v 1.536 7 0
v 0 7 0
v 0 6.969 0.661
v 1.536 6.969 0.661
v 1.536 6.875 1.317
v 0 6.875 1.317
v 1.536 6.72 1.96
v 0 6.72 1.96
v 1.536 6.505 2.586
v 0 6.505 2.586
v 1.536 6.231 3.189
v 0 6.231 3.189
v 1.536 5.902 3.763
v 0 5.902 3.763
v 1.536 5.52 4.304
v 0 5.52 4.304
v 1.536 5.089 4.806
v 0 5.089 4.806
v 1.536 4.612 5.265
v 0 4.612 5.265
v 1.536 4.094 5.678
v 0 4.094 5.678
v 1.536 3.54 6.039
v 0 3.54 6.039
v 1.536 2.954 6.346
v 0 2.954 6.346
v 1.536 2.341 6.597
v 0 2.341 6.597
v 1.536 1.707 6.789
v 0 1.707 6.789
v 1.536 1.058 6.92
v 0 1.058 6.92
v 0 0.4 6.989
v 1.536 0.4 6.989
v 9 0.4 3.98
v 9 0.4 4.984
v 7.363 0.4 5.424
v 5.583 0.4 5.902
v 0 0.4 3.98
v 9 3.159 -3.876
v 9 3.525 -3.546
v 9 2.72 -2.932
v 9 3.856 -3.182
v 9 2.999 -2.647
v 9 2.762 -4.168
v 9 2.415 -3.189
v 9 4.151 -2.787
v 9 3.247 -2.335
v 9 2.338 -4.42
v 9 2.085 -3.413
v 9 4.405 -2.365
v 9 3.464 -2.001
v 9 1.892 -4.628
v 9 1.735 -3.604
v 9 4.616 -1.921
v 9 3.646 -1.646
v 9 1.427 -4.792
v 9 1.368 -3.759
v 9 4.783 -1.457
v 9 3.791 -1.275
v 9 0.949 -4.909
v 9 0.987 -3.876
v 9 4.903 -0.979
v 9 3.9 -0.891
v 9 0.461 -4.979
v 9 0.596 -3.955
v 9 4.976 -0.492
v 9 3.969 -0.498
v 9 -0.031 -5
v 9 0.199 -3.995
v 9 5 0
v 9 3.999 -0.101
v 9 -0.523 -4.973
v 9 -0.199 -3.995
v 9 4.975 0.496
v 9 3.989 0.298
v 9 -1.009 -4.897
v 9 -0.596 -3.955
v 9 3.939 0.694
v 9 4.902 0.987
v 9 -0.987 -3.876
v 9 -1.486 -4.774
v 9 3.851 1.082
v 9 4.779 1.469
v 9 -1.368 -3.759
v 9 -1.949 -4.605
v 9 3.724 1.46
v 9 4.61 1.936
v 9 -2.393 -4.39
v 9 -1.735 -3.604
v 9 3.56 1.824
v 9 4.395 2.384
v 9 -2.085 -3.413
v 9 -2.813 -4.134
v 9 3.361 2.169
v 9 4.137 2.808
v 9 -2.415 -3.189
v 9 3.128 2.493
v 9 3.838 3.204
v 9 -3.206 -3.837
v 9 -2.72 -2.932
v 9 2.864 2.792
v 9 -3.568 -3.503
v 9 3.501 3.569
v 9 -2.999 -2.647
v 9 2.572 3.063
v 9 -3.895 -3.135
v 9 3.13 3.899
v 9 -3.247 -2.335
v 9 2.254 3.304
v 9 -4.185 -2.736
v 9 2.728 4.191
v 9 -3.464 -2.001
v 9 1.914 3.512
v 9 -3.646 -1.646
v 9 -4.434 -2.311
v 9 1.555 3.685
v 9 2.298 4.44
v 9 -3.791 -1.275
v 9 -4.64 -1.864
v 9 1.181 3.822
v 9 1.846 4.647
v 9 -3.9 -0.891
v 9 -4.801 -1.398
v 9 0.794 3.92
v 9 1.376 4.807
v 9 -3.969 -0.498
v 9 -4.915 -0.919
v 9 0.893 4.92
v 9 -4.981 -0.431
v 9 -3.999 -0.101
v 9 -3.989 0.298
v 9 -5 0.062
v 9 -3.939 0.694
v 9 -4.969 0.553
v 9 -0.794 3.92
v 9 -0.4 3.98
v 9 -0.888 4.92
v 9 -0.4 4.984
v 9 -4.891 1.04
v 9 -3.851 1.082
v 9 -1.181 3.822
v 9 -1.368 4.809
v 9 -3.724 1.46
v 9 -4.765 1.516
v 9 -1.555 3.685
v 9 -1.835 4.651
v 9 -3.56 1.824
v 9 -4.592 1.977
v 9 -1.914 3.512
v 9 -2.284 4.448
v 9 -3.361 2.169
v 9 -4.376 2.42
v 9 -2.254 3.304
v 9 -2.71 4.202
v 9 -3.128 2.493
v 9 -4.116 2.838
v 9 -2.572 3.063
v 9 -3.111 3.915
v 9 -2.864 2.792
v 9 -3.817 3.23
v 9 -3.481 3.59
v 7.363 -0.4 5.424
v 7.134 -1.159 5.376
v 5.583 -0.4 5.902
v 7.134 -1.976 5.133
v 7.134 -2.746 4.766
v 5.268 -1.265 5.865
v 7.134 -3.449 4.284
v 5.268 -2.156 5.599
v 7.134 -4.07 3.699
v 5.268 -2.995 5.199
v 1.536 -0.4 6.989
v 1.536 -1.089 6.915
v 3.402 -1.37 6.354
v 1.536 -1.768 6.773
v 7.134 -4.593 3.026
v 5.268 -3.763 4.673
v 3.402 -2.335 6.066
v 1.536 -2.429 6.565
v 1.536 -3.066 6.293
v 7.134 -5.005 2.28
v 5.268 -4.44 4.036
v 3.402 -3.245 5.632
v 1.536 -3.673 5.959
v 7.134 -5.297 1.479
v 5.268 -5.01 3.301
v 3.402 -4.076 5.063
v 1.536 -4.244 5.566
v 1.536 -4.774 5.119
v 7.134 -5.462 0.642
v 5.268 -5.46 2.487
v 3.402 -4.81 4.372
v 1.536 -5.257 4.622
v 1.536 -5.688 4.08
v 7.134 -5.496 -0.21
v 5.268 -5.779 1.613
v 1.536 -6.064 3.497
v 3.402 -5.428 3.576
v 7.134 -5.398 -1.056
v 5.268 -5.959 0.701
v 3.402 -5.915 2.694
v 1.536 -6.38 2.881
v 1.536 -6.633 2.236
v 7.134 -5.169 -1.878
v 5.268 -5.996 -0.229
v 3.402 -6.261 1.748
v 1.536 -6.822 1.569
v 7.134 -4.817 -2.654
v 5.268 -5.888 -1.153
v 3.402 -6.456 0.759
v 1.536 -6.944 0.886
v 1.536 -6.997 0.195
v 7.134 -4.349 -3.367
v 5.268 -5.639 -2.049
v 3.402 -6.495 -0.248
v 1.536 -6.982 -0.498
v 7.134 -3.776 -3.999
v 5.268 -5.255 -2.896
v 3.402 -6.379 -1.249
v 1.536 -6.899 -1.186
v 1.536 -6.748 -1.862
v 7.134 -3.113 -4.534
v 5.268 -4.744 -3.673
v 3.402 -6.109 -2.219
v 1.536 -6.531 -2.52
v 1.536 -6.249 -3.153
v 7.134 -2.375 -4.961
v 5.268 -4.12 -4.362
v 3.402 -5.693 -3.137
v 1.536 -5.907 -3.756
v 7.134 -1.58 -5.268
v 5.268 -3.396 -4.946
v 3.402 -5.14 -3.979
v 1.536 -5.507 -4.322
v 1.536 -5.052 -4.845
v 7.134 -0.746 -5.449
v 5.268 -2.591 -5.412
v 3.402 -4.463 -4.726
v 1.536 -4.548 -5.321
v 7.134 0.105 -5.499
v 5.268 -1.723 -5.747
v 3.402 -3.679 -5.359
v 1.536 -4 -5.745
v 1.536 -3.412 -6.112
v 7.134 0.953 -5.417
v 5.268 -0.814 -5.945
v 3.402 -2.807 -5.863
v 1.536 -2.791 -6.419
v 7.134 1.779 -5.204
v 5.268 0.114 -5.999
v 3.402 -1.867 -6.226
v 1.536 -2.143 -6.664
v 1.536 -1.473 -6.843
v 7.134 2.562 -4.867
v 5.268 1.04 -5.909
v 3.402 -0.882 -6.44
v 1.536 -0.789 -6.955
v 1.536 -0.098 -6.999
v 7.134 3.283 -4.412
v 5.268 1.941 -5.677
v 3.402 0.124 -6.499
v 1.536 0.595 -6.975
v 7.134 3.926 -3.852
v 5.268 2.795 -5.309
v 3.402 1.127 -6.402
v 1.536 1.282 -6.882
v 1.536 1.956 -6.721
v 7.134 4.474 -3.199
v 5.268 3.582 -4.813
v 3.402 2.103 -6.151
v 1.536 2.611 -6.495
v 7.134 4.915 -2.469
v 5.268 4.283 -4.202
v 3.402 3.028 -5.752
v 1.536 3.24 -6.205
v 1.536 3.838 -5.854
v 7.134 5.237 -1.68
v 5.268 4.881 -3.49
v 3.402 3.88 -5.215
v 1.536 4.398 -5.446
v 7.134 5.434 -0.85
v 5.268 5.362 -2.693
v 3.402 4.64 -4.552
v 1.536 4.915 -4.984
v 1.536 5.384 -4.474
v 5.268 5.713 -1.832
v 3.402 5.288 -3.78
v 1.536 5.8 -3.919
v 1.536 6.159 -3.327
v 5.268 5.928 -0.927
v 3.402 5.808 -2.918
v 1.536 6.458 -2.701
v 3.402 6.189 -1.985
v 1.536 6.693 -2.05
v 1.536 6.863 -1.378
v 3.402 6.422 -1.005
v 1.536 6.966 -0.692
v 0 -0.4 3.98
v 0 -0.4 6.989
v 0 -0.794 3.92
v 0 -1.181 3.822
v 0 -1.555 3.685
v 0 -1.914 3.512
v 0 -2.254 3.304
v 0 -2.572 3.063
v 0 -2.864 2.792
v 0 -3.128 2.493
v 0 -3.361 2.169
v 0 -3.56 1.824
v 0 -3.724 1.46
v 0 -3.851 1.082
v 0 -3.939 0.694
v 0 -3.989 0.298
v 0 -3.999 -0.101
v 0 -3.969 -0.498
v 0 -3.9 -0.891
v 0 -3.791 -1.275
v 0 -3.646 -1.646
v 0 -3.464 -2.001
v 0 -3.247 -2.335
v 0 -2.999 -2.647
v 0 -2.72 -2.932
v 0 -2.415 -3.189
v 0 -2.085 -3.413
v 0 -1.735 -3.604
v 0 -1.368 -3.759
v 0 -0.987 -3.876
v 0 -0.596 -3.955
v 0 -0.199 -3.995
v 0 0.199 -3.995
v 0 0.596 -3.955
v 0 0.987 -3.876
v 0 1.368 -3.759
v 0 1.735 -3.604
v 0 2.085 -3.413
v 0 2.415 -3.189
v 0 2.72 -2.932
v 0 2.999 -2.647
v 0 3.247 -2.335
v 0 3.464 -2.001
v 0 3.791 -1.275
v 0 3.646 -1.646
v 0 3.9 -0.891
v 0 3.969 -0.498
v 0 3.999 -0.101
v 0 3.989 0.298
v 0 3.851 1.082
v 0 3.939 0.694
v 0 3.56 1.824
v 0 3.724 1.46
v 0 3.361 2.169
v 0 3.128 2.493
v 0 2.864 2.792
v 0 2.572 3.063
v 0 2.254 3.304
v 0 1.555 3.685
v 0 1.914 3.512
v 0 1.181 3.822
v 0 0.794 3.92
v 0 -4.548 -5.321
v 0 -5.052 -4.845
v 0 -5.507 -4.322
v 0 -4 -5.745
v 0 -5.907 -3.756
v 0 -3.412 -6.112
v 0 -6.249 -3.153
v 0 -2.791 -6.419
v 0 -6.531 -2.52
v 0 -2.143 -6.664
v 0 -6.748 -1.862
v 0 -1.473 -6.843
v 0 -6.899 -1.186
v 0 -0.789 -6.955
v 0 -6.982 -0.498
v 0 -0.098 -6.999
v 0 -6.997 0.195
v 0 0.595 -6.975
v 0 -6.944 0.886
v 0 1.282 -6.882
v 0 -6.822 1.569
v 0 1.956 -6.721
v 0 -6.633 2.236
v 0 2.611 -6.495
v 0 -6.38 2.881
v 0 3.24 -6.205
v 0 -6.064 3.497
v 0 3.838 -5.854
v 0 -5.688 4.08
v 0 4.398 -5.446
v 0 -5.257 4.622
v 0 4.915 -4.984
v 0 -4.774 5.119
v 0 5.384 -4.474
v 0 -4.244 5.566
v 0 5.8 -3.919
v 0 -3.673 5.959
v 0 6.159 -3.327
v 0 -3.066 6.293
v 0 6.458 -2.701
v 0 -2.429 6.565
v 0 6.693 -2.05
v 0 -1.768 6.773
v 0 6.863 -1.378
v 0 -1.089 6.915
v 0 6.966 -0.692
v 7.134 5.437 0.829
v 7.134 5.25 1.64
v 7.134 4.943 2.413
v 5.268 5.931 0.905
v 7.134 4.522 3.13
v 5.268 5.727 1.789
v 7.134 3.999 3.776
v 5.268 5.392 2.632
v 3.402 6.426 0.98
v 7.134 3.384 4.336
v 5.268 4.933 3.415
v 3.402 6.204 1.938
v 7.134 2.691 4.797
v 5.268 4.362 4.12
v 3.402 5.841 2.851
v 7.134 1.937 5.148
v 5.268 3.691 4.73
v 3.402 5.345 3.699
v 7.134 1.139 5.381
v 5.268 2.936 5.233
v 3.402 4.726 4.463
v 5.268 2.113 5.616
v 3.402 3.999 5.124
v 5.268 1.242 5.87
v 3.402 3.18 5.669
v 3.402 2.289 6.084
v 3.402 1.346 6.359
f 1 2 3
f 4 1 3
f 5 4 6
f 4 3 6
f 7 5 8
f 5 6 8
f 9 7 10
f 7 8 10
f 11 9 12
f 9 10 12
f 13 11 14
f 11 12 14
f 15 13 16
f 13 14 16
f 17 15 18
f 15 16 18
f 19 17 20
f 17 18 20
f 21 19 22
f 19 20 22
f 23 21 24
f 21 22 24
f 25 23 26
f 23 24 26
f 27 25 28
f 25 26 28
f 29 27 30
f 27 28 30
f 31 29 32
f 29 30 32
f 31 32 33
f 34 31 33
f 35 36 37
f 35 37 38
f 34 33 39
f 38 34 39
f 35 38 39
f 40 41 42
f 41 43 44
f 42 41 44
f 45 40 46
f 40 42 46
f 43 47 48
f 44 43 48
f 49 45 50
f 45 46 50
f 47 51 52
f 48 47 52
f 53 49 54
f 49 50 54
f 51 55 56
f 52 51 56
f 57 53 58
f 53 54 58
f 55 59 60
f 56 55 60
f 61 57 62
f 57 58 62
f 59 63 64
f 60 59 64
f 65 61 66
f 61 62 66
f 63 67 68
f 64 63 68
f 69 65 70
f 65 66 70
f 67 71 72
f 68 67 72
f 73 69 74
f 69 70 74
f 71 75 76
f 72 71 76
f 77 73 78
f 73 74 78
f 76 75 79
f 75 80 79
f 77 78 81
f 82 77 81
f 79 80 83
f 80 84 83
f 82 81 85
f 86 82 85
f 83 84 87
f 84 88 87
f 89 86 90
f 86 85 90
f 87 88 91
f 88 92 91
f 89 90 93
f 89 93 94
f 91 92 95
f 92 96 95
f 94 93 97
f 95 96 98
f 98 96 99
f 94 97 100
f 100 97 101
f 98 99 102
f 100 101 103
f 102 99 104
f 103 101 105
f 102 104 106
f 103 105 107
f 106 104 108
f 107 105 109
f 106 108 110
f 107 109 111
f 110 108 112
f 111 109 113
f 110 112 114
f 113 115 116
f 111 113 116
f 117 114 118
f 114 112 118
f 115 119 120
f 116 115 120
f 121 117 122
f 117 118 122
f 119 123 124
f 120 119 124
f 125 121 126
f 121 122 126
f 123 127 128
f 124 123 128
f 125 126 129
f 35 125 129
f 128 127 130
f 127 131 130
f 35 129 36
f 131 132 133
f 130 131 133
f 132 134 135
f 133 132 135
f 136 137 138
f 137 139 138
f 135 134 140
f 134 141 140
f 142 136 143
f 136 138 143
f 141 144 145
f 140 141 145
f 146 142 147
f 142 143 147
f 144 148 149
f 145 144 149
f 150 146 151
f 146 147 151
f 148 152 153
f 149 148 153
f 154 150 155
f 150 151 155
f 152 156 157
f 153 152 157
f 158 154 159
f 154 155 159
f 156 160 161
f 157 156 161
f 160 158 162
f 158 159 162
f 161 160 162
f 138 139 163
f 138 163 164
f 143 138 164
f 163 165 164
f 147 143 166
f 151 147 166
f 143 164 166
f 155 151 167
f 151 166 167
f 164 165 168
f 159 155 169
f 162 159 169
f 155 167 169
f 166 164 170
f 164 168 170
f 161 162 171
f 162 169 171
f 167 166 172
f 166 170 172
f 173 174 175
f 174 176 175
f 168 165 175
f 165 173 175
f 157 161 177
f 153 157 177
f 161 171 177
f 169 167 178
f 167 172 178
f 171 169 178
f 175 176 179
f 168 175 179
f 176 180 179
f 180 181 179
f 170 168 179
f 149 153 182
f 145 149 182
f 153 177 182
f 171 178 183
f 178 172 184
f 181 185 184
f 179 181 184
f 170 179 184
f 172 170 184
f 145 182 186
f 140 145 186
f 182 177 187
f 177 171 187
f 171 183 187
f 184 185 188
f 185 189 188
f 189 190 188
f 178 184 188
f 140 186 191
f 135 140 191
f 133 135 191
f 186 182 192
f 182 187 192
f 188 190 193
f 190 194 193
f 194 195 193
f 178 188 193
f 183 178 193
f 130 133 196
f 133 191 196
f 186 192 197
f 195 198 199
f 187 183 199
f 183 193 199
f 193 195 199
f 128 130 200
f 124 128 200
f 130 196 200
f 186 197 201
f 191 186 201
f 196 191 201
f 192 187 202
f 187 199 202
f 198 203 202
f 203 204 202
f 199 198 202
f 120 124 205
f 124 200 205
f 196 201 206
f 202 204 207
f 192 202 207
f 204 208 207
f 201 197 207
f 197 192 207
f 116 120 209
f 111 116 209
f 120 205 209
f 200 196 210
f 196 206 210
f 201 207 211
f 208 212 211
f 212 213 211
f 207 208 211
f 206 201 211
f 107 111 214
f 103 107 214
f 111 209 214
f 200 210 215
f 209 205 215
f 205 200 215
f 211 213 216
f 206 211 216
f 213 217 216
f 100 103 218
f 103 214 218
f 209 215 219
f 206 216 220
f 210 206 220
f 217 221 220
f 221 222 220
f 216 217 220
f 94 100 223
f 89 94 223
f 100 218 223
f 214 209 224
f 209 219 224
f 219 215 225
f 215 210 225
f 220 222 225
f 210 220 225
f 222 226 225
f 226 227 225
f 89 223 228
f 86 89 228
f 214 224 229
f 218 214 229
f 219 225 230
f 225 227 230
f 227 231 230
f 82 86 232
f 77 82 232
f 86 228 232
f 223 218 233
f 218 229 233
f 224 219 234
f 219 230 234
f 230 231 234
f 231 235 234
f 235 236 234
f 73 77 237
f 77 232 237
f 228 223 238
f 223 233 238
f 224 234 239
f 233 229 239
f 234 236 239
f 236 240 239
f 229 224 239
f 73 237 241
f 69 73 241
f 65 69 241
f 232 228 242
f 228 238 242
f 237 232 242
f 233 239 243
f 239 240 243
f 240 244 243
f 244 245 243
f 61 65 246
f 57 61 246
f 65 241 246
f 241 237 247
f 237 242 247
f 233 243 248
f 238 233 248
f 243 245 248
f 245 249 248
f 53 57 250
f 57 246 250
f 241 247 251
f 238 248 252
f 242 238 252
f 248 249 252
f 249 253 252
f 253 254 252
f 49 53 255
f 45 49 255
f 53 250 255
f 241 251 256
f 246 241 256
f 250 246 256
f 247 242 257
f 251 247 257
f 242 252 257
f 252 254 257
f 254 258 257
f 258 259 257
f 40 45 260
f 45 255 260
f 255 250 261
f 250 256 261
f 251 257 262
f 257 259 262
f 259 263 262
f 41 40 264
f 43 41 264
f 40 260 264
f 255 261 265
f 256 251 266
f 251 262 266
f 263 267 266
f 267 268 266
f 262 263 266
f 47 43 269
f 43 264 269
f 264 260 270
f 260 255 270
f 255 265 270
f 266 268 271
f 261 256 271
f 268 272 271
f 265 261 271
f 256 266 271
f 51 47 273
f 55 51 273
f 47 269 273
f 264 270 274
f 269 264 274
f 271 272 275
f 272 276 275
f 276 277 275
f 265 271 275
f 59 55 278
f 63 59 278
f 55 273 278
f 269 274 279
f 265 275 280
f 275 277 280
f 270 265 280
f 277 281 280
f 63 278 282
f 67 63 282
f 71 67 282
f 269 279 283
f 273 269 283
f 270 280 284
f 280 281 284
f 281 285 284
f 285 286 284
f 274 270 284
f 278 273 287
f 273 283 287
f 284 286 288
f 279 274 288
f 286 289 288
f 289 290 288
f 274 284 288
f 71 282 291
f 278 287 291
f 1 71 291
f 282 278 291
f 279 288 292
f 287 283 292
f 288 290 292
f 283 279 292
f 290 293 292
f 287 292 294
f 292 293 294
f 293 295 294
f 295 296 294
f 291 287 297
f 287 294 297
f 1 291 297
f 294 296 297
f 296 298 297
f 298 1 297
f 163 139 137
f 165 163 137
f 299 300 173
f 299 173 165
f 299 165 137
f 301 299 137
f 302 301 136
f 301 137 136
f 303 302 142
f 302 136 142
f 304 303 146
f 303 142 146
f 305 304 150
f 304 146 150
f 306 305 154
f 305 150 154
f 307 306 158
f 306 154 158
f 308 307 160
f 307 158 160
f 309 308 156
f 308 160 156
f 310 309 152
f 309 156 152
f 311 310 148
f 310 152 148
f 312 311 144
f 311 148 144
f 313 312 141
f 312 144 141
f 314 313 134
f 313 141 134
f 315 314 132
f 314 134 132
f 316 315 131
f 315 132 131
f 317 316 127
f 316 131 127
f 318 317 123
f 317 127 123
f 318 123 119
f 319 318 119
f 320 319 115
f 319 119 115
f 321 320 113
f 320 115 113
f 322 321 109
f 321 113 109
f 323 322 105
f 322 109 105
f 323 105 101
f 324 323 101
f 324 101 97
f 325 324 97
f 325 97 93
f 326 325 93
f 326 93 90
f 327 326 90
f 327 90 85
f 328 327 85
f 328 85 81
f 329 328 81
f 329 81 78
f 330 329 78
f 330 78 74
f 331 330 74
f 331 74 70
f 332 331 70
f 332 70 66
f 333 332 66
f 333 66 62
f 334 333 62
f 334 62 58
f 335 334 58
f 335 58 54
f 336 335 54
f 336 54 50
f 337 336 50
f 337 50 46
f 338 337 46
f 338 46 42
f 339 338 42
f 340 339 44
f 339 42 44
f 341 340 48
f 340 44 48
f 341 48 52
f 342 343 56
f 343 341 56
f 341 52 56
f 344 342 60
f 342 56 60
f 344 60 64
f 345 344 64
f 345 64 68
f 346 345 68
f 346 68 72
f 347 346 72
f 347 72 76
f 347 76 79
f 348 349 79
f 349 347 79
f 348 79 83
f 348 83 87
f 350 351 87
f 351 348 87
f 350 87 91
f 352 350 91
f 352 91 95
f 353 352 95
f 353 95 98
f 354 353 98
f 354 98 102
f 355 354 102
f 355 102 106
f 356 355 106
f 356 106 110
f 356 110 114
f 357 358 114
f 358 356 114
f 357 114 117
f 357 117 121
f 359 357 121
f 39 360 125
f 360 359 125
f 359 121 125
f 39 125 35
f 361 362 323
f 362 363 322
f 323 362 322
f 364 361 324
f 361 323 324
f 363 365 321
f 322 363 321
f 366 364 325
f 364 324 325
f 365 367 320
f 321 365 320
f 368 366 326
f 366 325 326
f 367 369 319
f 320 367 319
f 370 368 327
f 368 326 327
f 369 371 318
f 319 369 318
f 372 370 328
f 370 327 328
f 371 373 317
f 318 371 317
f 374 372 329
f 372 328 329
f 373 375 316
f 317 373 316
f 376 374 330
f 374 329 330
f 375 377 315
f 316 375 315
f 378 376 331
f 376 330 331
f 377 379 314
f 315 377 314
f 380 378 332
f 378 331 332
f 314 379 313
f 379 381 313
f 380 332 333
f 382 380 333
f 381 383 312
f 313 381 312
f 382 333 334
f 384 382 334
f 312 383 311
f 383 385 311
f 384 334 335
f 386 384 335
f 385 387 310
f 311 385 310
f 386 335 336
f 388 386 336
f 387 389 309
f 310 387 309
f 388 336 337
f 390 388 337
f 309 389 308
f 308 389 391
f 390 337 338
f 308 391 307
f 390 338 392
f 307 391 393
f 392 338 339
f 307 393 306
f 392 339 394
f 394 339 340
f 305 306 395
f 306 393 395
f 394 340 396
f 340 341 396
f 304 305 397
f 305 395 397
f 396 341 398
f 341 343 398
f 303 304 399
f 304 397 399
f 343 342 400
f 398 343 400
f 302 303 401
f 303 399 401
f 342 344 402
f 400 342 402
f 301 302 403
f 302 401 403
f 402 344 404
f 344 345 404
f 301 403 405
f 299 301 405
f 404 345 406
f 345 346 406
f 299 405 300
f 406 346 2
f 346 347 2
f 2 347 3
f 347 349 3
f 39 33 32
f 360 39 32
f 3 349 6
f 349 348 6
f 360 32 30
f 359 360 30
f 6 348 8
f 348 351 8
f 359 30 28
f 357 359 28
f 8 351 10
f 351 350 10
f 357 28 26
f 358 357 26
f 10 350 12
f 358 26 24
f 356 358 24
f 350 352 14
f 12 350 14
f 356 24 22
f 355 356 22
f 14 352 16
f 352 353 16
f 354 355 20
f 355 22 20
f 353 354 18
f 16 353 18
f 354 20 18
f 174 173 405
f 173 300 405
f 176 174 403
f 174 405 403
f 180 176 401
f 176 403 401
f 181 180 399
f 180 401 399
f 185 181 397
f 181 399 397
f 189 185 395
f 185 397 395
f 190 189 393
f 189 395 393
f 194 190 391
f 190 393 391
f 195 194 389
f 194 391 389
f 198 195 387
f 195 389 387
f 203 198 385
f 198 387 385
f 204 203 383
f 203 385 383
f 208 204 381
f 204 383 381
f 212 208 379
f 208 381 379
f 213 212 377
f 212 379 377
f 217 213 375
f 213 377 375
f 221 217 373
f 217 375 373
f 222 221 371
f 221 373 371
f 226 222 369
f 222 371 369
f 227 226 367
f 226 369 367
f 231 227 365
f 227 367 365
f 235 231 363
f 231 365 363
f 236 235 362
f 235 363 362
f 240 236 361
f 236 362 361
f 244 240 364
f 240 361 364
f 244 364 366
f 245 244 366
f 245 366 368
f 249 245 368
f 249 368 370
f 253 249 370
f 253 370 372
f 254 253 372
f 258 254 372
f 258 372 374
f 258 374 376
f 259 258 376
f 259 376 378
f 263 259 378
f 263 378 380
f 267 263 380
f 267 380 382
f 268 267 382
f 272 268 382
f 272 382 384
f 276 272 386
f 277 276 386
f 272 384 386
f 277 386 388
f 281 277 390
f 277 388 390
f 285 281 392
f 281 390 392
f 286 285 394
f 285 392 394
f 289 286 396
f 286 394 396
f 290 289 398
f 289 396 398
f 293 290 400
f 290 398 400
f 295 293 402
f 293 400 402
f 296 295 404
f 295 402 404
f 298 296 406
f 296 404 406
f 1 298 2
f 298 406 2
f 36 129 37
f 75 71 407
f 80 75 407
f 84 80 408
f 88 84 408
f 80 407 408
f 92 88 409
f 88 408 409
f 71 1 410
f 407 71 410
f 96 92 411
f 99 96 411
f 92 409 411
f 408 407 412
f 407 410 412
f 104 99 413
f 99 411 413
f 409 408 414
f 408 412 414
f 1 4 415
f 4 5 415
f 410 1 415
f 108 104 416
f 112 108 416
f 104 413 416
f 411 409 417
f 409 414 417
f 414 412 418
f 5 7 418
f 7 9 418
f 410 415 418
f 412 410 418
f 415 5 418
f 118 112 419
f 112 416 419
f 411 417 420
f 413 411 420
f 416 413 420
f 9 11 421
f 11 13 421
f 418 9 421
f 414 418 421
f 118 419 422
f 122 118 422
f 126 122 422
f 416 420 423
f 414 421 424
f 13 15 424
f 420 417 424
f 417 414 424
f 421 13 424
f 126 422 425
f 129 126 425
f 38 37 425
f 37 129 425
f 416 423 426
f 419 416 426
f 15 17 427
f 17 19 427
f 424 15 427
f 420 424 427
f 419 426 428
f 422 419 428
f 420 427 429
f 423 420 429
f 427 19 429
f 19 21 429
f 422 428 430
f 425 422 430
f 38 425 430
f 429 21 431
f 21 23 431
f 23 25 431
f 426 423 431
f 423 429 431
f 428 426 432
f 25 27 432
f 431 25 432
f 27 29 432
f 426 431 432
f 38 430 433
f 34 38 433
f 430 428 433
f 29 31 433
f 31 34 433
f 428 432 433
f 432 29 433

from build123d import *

# Parameters (mm, degrees)
SCHNITT_LINEAR_AUSTRAGEN1_REACH = 11
SKIZZE2_W                       = 6.040100504
SKIZZE2_H                       = 0.8


with BuildPart() as part:
    # Skizze1 → Rotation1 (revolve)
    with BuildSketch(Plane.XY):
        Polygon((0, 4), (9, 4), (9, 5), (1.535898385, 7), (0, 7), align=None)
    revolve(axis=Axis((0, 0, 0), (1, 0, 0)))

    # Skizze2 → Schnitt-Linear austragen1 (cut, up to next)
    with BuildSketch(Plane(origin=(0, 0, 0), x_dir=(0, 0, -1), z_dir=(1, 0, 0)), mode=Mode.PRIVATE) as schnitt_linear_austragen1_sk1:
        with Locations((-7, 0)):
            Rectangle(SKIZZE2_W, SKIZZE2_H)
    schnitt_linear_austragen1_tool1 = extrude(schnitt_linear_austragen1_sk1.sketch, amount=SCHNITT_LINEAR_AUSTRAGEN1_REACH, mode=Mode.PRIVATE) & part.part
    add(schnitt_linear_austragen1_tool1.solids().sort_by_distance((0, 0, 7))[0], mode=Mode.SUBTRACT)


solid = part.part
